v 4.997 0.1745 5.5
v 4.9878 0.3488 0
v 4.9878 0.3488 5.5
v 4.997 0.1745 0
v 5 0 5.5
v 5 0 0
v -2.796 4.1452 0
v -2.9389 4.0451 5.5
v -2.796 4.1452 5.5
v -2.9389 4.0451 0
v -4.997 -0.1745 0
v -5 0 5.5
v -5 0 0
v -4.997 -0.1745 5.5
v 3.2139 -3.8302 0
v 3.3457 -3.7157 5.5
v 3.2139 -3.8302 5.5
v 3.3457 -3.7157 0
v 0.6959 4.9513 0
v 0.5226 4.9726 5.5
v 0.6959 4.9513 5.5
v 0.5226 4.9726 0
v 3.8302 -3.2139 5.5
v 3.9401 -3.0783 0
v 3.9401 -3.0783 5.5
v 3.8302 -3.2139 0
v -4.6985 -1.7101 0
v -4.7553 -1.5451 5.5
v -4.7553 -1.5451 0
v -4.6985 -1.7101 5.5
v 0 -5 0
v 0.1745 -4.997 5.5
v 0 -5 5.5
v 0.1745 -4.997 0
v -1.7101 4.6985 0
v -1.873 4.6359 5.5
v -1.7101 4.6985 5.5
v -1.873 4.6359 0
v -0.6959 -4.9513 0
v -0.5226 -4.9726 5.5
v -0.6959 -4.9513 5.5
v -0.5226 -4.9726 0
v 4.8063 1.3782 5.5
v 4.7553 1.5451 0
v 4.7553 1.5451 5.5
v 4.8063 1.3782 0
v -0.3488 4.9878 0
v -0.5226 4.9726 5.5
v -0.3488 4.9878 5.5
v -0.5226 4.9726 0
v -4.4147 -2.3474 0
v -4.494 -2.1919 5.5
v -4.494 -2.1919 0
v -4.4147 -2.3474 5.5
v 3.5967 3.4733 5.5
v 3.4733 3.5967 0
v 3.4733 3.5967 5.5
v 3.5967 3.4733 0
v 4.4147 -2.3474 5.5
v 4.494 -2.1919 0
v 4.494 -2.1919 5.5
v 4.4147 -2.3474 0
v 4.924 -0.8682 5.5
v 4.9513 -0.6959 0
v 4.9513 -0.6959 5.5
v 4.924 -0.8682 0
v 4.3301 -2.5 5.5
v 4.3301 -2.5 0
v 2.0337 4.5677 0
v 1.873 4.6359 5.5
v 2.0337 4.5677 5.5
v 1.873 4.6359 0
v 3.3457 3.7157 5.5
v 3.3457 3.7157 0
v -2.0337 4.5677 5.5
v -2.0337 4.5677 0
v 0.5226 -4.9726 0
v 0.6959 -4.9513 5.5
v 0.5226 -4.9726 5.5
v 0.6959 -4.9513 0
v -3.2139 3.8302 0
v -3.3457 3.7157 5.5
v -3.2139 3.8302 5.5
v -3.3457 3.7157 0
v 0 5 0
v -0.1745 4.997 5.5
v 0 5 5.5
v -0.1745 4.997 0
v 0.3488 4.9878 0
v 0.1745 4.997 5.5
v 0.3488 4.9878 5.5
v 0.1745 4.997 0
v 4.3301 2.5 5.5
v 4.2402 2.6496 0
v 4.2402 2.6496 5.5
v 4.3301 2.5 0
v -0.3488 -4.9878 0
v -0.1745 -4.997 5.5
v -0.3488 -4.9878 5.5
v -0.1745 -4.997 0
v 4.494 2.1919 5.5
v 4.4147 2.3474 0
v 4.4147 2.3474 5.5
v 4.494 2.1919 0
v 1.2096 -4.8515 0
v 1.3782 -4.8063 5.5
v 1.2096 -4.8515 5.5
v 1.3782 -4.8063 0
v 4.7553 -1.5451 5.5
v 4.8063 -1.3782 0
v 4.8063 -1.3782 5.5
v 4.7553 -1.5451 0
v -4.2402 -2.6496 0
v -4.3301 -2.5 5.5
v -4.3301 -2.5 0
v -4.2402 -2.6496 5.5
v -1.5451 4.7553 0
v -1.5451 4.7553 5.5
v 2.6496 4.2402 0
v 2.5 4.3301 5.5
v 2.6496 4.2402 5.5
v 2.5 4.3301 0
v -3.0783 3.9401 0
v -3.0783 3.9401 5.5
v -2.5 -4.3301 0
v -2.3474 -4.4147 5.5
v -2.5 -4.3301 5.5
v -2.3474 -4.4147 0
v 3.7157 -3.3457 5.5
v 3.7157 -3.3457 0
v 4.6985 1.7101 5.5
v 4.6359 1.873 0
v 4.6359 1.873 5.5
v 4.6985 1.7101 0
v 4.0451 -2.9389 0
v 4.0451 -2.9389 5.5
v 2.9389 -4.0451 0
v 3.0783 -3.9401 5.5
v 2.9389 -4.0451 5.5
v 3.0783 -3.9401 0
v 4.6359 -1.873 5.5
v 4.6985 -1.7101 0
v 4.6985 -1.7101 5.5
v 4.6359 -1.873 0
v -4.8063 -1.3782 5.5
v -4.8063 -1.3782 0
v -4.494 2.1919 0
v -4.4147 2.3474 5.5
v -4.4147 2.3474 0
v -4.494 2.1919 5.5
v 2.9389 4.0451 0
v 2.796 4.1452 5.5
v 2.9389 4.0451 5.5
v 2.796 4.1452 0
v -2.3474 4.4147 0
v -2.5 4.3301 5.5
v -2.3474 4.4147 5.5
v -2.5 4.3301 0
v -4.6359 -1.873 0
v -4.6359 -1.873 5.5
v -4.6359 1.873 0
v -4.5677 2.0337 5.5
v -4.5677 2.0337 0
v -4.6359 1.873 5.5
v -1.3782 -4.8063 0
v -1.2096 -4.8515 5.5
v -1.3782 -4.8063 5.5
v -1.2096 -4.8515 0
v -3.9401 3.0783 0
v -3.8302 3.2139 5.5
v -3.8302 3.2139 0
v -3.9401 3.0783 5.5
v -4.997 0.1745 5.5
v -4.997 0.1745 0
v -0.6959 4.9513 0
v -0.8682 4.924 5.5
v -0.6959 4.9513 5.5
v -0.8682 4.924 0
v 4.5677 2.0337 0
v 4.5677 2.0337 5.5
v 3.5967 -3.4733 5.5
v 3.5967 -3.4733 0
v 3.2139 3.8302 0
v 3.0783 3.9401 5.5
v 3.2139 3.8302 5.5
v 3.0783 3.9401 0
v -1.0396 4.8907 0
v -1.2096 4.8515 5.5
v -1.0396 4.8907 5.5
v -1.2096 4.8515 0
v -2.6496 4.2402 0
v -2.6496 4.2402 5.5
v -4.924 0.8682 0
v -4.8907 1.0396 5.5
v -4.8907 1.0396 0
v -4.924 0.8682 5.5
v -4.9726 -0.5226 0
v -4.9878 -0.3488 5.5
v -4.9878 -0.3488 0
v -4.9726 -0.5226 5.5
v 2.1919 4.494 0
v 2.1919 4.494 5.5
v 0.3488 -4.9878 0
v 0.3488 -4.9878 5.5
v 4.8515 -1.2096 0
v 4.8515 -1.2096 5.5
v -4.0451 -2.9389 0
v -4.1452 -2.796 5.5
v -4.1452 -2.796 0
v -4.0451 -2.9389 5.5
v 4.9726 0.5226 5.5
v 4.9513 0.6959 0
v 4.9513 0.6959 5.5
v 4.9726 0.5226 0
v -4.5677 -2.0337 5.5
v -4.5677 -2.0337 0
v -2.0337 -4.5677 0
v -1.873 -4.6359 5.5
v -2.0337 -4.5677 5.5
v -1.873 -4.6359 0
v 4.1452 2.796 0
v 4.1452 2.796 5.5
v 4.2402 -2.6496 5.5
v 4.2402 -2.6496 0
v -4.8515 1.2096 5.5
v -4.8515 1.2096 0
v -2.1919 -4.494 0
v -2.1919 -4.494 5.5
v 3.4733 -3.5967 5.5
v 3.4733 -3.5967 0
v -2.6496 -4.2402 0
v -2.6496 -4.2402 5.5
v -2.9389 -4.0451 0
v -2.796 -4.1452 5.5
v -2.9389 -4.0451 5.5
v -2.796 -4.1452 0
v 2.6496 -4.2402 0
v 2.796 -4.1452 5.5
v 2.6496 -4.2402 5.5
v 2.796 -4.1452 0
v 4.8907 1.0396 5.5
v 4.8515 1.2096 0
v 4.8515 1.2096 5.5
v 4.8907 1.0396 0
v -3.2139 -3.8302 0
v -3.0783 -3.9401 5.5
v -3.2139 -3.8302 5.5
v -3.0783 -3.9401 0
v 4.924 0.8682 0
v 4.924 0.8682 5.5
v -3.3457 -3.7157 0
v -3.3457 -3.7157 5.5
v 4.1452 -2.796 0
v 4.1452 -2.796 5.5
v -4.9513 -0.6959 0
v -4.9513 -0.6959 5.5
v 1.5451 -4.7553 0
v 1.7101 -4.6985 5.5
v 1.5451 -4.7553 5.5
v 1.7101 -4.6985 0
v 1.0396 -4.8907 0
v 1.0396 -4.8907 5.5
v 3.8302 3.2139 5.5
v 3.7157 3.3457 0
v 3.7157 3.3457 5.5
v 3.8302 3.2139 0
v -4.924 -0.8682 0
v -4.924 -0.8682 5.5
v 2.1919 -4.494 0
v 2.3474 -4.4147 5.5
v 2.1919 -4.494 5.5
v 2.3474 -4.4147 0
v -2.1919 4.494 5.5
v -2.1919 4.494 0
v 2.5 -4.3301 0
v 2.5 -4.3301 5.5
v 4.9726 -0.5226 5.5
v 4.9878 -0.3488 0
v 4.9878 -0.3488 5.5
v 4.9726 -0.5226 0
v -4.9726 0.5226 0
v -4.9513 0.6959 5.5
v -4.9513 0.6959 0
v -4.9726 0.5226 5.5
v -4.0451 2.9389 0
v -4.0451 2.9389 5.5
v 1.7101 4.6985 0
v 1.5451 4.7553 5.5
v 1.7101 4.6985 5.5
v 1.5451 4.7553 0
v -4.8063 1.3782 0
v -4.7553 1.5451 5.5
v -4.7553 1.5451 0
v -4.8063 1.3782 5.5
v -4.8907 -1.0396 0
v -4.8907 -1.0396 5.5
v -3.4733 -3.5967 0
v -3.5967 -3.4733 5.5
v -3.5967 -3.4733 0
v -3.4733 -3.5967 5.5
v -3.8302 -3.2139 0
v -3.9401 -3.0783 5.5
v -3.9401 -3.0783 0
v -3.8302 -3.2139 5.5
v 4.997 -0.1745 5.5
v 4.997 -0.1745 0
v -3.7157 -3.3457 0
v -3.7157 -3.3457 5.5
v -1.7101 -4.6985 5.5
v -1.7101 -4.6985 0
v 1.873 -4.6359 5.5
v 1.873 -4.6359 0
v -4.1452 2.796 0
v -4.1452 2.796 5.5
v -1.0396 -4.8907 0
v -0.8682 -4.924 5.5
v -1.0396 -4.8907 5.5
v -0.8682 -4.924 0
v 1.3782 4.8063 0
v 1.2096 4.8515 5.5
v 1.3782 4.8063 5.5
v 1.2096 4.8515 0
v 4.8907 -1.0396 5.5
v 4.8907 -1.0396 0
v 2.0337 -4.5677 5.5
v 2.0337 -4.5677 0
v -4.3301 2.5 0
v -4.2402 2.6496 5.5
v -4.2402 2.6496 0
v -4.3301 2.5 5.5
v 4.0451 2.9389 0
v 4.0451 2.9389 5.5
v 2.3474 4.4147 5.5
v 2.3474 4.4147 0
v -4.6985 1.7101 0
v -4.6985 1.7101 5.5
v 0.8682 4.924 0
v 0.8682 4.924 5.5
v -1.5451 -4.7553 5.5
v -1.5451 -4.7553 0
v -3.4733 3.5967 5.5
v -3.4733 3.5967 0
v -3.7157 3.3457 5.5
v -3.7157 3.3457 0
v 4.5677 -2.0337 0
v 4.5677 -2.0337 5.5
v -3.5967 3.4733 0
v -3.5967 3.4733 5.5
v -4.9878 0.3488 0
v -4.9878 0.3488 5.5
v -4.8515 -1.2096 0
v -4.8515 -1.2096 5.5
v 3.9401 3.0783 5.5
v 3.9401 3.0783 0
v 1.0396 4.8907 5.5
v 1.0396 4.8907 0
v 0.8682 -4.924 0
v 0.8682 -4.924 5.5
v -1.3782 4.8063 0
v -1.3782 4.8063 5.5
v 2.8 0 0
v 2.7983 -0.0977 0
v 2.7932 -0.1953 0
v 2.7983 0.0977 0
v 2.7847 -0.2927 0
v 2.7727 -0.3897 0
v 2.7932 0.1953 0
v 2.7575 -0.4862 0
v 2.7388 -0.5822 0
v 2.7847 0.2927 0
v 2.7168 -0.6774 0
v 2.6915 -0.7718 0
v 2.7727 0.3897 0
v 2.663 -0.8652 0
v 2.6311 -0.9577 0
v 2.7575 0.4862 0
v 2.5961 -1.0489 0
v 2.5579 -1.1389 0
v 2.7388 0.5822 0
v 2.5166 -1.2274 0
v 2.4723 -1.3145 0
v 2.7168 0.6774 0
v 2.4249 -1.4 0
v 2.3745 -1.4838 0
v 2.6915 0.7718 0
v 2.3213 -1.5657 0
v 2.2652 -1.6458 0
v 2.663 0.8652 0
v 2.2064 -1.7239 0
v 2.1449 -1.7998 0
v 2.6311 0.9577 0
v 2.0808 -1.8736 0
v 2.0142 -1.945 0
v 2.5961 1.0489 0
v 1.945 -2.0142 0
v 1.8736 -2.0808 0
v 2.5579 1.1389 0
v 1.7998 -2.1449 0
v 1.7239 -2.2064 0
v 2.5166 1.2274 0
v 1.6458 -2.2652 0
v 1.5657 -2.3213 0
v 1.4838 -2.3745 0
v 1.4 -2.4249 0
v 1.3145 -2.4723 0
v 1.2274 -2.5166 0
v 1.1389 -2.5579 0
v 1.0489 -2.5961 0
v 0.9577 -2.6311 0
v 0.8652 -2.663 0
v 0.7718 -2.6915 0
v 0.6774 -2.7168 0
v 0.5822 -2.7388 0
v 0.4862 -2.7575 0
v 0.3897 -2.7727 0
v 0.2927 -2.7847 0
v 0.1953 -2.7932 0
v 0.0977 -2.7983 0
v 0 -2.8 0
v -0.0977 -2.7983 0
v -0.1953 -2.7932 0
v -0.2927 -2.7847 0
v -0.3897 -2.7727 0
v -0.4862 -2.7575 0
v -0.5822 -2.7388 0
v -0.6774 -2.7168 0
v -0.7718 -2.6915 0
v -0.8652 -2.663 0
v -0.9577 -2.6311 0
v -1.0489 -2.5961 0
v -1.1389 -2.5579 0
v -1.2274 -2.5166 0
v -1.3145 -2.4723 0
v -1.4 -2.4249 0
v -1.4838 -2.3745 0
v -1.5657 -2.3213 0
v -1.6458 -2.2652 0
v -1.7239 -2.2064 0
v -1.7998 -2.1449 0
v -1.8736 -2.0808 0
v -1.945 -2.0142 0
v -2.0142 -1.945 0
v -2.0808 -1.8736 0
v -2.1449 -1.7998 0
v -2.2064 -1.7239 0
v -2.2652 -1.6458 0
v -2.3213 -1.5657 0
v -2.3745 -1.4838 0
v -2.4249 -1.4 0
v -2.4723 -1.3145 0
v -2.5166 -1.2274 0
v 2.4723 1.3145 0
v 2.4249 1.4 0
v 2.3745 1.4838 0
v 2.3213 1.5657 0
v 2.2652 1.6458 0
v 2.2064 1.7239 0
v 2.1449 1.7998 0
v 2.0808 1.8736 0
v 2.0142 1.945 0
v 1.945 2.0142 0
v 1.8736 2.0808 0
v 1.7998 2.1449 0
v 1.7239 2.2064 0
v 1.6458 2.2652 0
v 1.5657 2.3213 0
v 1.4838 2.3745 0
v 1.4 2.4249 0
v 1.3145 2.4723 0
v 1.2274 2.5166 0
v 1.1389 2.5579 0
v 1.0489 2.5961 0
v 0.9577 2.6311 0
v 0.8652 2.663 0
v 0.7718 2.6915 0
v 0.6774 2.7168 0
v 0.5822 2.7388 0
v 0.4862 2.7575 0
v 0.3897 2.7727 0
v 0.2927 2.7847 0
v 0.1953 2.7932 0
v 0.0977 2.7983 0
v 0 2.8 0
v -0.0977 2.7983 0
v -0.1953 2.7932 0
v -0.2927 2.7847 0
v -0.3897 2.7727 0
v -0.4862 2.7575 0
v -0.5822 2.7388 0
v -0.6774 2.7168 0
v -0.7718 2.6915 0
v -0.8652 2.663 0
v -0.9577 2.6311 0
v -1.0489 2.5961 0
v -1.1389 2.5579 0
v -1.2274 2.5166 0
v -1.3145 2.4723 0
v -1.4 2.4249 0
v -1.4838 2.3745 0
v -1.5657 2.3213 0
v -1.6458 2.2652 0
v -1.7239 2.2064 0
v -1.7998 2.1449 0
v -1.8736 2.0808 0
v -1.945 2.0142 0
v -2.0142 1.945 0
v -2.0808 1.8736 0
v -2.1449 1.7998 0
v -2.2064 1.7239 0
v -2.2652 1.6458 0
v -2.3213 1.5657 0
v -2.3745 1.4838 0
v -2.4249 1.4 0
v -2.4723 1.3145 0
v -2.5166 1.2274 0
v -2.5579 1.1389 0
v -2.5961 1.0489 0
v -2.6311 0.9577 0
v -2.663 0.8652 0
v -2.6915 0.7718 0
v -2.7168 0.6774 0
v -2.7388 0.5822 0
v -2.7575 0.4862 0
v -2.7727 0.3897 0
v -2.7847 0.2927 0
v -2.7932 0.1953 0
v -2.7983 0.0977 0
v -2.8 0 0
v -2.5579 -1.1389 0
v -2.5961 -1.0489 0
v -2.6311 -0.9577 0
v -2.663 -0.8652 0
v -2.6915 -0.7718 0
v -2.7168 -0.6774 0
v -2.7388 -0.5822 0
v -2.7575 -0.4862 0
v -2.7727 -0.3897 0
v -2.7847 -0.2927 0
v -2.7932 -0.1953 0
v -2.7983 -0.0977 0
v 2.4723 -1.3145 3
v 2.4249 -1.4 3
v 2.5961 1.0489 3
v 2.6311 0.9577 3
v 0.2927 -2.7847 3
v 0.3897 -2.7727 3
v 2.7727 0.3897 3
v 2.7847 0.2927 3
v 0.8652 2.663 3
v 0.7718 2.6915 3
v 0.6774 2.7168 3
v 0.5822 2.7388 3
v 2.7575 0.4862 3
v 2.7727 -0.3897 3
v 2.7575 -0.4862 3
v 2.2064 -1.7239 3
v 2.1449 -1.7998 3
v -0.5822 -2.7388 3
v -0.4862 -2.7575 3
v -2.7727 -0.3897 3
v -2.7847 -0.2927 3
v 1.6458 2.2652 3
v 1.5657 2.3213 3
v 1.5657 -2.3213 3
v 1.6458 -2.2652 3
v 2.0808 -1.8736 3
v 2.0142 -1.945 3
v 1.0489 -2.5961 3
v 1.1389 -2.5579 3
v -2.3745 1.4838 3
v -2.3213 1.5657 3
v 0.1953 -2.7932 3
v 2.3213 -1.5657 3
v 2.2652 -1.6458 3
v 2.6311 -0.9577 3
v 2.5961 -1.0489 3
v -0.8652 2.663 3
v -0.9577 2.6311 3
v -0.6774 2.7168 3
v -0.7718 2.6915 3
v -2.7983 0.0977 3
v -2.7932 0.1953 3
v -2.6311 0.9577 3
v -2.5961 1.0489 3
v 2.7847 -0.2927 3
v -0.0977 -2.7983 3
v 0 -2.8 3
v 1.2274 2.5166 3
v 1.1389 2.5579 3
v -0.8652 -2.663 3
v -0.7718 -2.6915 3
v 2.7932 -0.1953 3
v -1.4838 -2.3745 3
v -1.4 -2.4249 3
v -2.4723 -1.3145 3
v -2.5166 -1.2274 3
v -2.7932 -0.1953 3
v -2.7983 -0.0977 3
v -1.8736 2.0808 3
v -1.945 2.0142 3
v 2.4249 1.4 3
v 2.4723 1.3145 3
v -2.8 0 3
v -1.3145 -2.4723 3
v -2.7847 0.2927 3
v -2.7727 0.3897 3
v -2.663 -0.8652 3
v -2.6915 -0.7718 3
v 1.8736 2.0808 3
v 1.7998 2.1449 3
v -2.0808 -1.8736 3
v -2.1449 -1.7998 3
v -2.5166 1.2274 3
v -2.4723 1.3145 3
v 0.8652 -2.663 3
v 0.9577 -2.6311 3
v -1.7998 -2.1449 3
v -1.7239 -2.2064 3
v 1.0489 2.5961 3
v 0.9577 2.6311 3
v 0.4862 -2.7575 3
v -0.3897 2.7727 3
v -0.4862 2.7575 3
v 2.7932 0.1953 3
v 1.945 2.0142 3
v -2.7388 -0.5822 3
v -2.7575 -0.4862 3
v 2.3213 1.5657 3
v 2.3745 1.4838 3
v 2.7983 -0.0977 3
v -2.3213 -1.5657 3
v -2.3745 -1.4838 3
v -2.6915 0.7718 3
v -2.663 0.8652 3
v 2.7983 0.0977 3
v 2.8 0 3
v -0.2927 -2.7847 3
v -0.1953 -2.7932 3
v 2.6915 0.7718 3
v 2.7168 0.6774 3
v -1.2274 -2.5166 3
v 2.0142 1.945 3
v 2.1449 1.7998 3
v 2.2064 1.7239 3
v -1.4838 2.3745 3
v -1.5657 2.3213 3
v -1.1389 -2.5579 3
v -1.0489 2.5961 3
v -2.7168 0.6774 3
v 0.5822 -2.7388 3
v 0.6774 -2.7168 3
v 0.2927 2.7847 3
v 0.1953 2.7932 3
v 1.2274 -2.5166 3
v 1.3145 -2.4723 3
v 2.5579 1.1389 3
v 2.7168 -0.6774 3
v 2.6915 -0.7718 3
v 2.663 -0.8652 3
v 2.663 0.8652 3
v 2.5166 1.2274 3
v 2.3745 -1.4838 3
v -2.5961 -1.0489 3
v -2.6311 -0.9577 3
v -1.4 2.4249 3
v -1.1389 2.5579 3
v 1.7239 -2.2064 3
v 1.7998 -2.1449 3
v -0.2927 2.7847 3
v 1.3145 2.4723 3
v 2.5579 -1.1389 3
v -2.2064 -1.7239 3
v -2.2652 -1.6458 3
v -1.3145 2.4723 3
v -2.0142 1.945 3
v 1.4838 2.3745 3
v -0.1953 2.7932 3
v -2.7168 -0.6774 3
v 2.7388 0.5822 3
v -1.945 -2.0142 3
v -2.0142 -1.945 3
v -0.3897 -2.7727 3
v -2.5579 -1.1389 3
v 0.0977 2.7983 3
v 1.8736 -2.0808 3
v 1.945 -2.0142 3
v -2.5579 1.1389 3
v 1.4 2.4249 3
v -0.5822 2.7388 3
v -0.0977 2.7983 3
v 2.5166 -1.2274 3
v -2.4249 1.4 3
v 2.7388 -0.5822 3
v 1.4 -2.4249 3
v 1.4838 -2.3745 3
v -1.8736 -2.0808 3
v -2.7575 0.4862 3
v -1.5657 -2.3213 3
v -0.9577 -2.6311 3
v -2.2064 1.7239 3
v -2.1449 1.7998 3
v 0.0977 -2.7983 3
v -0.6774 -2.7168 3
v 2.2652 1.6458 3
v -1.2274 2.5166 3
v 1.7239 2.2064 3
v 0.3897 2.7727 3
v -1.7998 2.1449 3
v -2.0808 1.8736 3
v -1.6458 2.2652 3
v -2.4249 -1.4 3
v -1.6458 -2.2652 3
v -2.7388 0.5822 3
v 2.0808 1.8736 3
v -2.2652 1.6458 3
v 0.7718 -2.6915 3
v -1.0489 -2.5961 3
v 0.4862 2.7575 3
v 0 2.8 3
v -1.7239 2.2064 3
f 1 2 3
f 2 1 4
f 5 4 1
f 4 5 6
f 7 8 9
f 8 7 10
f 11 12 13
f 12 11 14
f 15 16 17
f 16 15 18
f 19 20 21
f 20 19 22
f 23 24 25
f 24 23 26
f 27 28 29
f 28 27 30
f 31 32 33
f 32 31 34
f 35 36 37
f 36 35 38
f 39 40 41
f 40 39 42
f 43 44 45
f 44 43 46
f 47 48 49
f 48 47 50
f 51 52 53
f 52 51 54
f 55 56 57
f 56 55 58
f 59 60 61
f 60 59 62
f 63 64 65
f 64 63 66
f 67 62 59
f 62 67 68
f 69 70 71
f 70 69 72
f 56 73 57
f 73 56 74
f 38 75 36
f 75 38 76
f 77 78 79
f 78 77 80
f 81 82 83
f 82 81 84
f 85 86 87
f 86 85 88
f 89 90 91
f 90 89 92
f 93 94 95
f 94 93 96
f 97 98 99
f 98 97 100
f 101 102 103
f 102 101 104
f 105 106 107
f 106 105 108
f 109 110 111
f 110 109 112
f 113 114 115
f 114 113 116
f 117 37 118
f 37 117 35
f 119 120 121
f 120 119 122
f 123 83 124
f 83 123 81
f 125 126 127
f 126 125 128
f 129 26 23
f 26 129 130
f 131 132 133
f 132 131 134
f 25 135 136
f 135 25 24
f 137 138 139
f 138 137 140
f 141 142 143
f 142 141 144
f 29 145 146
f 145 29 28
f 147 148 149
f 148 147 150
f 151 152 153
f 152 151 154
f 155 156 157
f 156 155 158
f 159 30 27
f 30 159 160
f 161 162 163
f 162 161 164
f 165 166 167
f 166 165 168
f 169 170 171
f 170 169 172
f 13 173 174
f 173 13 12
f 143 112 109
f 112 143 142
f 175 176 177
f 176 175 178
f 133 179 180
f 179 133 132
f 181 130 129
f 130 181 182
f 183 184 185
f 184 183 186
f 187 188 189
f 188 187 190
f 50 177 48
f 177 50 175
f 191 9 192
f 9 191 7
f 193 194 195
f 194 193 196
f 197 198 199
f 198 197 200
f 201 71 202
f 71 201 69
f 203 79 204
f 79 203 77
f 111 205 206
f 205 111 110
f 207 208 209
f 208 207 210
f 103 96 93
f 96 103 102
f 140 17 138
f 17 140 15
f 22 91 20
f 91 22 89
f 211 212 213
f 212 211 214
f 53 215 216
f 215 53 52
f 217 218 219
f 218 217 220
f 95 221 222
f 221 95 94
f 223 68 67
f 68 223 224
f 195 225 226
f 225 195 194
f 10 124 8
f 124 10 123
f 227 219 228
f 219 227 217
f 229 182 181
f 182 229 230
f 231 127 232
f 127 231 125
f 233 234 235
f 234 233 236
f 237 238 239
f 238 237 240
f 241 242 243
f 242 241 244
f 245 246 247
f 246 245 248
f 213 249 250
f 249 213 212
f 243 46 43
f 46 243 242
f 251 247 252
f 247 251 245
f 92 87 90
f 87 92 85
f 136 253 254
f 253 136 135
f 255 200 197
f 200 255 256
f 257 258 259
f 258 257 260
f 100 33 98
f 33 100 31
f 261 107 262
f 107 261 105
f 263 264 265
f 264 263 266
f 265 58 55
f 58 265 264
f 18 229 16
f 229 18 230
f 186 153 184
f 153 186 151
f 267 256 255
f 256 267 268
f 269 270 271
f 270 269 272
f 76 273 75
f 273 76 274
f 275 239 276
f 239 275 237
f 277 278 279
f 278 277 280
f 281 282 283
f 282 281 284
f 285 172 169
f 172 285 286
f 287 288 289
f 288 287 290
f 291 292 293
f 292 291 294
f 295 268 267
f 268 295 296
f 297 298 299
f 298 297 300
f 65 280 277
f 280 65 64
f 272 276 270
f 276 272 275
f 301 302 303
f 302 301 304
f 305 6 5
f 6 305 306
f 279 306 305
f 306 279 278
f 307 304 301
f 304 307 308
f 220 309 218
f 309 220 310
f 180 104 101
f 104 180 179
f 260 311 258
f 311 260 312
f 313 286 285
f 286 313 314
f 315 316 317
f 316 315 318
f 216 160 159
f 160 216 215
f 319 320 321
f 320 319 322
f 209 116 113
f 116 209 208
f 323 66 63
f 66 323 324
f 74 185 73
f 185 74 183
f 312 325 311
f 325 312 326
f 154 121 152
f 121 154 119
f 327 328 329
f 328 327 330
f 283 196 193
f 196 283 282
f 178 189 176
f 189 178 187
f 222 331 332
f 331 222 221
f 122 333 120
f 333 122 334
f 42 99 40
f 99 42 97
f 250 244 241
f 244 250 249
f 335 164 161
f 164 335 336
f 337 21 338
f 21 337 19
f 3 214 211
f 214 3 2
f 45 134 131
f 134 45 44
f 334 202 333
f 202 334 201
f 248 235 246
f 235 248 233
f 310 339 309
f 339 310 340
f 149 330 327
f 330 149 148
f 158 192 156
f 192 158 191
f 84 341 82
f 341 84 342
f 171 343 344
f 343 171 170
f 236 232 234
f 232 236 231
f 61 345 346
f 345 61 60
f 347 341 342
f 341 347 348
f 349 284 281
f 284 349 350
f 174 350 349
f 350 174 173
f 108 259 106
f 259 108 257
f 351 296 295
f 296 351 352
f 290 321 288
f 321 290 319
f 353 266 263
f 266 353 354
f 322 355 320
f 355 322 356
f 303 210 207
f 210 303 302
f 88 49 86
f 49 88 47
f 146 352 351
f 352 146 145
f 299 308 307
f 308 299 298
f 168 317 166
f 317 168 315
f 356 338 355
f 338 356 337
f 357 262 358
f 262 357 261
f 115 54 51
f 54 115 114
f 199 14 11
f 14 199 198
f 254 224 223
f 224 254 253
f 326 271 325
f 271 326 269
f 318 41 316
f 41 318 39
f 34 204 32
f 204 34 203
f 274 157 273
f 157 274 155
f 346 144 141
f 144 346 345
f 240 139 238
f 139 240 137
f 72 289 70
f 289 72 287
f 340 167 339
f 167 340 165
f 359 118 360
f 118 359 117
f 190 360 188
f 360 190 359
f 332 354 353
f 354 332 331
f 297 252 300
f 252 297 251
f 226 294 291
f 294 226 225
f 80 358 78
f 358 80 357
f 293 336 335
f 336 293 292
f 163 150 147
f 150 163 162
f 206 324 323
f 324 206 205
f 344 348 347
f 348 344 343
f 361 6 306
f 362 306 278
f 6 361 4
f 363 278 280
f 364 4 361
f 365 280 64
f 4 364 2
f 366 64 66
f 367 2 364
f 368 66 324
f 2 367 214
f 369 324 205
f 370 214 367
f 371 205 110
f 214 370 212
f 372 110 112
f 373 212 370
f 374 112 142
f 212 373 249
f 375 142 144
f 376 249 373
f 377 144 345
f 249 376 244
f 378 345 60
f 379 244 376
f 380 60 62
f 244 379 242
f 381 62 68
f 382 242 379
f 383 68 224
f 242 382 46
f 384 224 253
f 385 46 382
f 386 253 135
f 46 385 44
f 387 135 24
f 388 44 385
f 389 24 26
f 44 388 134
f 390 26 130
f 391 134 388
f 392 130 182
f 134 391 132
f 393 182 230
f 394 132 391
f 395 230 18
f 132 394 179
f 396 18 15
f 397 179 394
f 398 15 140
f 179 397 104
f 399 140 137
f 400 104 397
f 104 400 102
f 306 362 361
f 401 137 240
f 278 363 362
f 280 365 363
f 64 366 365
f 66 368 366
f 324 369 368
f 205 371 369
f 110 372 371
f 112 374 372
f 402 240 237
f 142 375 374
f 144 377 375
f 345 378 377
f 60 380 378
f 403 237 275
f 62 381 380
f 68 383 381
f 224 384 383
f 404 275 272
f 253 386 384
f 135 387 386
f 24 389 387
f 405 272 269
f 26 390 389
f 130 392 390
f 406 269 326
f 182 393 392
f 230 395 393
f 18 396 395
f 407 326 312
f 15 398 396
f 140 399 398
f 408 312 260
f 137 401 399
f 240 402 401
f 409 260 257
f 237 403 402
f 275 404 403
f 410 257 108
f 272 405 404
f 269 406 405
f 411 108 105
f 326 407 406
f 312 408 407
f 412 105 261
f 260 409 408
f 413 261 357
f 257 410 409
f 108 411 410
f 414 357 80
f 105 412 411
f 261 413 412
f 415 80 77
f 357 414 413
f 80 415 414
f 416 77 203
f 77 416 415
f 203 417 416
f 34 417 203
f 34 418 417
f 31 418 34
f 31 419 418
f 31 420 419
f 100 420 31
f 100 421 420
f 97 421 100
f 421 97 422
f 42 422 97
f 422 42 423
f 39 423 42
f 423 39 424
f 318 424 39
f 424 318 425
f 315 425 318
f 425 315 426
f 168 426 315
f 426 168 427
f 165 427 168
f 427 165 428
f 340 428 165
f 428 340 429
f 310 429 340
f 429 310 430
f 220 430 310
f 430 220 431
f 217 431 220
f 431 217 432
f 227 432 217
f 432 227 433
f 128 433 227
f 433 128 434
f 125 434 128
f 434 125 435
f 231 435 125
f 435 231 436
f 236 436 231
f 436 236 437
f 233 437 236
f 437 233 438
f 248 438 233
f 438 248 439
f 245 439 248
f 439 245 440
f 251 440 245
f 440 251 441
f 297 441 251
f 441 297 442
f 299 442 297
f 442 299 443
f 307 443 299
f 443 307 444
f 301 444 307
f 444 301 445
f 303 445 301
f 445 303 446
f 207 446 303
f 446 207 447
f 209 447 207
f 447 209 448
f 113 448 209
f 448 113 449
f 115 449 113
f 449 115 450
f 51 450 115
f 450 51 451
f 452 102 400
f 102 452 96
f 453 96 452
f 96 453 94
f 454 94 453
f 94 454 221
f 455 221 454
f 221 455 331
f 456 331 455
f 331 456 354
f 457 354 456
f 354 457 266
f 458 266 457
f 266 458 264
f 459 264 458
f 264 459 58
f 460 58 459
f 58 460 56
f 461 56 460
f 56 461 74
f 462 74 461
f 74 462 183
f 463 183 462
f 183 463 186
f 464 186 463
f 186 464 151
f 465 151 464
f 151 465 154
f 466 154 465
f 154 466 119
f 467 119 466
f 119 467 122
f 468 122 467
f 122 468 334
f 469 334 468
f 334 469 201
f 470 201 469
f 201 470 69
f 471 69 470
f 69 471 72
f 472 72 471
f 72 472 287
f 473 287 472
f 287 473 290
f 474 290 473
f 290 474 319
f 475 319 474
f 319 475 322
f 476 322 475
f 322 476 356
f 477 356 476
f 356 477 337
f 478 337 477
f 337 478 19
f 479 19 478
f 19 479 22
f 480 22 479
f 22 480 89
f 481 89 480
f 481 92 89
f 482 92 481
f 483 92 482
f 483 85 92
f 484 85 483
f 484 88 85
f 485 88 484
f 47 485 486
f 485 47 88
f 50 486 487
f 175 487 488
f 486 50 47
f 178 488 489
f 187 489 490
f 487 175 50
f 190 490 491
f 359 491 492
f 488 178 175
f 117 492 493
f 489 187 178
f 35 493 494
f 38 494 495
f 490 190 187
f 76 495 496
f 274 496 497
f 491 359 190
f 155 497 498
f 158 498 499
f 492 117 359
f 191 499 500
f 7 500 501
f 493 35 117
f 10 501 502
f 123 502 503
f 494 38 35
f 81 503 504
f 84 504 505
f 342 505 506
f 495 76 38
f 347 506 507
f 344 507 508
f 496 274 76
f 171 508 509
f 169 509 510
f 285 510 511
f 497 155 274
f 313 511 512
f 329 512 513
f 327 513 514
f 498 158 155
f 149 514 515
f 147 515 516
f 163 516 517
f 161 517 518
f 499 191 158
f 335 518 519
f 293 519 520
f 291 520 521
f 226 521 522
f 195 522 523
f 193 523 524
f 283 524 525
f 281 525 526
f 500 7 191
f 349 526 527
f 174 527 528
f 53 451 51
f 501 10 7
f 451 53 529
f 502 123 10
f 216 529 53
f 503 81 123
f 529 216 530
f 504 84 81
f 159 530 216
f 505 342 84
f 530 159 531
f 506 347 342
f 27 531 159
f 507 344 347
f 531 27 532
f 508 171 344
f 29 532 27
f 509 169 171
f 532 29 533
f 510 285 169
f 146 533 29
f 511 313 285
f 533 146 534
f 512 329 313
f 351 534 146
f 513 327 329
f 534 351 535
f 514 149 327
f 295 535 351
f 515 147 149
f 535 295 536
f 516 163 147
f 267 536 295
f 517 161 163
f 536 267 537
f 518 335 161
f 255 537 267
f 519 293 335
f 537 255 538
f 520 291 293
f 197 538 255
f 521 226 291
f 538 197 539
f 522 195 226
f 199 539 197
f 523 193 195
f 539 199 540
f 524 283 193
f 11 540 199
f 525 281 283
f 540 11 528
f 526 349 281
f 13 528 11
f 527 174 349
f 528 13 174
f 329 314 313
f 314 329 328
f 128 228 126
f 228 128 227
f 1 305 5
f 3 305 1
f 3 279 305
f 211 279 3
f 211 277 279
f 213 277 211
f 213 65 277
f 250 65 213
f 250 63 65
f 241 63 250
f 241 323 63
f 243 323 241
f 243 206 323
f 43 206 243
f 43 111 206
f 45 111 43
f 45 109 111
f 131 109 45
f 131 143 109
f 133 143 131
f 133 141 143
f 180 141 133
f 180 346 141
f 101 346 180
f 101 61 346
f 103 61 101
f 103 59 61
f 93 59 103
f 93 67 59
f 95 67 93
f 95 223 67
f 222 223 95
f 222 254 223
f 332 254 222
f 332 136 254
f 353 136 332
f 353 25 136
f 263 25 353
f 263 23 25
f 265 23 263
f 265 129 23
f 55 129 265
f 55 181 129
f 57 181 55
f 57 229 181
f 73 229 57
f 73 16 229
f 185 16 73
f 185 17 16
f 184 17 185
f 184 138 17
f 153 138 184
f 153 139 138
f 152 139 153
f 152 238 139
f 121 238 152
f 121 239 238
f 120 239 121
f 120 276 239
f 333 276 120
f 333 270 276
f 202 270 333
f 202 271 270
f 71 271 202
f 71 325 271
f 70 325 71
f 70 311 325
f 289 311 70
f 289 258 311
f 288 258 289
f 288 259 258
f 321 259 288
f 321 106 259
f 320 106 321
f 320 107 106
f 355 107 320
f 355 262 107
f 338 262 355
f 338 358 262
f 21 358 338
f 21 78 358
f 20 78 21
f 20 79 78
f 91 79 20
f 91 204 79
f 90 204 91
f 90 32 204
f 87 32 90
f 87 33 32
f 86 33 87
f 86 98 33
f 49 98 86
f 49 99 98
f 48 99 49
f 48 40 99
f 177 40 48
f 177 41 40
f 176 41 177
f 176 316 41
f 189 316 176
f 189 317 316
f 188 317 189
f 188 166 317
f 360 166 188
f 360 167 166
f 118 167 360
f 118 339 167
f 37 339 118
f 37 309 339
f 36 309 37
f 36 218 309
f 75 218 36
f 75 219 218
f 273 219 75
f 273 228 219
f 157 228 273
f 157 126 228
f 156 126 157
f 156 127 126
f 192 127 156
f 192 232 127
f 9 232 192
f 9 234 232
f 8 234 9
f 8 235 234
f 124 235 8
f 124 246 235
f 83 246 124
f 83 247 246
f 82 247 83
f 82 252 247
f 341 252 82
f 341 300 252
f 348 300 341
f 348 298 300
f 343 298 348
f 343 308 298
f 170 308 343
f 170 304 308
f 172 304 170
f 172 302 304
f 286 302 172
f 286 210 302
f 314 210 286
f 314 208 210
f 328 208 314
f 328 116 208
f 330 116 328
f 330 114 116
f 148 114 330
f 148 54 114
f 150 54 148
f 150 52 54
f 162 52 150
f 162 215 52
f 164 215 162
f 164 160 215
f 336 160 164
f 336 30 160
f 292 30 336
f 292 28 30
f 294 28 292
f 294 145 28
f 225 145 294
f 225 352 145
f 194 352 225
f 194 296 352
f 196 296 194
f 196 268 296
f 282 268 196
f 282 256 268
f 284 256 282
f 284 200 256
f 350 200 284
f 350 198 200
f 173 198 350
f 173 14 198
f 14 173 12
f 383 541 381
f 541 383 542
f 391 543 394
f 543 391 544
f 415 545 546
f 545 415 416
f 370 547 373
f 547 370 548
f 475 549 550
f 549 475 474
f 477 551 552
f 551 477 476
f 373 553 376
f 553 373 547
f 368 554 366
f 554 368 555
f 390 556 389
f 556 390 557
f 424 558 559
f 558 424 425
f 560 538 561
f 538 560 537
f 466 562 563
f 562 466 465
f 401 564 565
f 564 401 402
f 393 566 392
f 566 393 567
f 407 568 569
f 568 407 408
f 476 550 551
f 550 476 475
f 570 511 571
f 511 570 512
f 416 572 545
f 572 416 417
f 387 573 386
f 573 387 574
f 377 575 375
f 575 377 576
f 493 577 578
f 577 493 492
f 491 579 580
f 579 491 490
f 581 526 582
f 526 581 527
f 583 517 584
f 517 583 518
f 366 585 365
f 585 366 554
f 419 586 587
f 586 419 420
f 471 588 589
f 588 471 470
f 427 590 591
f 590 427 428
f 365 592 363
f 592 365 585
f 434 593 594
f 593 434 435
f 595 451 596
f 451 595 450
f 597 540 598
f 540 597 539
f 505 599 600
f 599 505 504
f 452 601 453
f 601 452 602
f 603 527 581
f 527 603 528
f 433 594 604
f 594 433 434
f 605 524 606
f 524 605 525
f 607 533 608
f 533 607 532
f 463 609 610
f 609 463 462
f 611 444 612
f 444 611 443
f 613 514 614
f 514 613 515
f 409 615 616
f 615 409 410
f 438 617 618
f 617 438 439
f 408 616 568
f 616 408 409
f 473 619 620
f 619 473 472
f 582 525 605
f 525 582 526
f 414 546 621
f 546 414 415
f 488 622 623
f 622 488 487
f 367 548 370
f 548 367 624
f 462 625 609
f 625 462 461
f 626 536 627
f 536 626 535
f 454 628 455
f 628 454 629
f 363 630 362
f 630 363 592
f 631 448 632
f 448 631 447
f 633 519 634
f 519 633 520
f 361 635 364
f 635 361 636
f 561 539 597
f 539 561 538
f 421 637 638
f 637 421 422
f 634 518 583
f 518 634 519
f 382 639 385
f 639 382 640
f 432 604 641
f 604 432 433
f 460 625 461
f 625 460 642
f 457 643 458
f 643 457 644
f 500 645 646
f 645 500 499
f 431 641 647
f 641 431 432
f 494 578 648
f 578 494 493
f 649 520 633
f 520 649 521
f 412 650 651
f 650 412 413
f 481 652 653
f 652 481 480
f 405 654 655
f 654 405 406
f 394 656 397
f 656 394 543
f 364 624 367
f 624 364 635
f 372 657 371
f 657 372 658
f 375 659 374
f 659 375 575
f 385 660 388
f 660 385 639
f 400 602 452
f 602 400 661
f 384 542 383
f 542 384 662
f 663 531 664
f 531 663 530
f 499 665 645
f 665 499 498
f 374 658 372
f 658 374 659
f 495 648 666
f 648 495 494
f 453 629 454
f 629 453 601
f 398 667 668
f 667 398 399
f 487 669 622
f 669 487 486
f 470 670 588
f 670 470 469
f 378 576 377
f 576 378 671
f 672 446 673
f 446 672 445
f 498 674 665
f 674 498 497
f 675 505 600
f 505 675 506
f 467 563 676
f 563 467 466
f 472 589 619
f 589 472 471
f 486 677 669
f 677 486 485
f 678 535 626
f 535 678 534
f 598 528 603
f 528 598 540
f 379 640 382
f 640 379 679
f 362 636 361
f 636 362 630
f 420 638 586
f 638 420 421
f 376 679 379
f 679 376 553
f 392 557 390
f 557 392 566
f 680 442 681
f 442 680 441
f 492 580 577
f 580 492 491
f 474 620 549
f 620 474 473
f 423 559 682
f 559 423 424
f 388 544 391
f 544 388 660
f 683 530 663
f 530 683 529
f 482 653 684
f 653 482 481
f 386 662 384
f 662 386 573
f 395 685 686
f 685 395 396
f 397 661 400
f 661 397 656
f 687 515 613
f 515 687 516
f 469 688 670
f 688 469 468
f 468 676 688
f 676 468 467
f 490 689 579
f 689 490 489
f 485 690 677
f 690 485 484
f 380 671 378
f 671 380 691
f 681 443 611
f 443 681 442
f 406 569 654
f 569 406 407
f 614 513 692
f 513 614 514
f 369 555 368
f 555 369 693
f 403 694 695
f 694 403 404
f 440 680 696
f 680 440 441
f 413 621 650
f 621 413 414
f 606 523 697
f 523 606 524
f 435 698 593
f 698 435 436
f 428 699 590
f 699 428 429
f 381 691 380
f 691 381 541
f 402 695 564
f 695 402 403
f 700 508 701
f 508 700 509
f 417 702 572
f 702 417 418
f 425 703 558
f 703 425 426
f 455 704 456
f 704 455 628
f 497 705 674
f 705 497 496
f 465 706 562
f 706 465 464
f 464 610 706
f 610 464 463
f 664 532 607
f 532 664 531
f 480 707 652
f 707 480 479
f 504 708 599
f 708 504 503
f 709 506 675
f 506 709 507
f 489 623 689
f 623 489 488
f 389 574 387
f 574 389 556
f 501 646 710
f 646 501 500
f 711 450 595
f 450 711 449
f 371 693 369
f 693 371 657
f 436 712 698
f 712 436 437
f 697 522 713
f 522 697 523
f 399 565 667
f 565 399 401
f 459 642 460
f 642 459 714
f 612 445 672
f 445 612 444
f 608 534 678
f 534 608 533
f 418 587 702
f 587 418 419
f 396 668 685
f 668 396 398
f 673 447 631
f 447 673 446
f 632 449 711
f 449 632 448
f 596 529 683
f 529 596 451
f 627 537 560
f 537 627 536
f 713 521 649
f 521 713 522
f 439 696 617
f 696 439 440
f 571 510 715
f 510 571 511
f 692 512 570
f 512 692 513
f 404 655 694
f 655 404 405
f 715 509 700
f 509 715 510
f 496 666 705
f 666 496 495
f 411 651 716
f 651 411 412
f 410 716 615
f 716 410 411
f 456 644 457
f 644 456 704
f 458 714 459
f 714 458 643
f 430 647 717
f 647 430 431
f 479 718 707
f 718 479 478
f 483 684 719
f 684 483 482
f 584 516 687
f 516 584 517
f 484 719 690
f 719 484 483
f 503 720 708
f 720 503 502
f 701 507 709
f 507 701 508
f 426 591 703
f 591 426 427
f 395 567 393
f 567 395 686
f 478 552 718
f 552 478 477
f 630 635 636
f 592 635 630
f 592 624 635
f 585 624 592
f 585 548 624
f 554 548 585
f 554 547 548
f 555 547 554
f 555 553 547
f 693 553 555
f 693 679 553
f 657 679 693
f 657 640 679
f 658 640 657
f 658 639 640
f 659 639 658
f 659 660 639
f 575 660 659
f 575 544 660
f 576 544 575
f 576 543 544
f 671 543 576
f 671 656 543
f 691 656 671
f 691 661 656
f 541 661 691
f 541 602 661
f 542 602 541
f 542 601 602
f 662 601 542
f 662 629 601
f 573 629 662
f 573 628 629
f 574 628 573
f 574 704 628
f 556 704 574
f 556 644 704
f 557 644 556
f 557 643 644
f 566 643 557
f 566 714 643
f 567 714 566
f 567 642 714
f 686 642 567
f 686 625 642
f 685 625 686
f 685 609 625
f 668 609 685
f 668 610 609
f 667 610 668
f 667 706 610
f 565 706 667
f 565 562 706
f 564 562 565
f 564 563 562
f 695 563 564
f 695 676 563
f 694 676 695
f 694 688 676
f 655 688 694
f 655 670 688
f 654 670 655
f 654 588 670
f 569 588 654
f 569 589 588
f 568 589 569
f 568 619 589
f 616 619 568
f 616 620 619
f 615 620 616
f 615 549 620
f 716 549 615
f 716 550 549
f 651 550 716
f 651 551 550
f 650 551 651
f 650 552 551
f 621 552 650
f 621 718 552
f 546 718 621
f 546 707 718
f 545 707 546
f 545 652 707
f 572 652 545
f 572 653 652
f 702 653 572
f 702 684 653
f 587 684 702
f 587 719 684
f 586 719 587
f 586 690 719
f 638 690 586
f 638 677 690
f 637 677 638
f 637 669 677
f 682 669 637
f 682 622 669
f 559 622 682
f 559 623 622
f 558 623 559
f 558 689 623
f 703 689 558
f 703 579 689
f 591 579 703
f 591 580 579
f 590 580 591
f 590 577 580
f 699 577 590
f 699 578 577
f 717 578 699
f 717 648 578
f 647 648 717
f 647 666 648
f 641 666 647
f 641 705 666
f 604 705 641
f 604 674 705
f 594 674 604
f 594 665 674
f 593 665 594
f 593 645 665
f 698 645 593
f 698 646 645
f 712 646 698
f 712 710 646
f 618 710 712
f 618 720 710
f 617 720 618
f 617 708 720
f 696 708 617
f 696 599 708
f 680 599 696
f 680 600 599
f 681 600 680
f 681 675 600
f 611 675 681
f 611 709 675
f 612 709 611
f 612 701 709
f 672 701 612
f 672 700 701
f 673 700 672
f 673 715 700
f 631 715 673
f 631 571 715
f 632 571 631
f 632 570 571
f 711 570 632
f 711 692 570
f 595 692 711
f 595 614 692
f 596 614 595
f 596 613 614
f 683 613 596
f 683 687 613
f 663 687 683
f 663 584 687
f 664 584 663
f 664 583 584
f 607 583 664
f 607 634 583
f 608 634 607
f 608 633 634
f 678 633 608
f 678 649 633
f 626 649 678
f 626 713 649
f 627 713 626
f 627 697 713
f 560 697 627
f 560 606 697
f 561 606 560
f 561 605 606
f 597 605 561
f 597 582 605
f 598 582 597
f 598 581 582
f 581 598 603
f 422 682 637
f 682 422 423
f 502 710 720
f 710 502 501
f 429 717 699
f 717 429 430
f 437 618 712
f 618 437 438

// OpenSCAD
$fn=180;

difference() {
	cylinder(h=5.5, d=10);
	cylinder(h=3, d=5.6);
}
